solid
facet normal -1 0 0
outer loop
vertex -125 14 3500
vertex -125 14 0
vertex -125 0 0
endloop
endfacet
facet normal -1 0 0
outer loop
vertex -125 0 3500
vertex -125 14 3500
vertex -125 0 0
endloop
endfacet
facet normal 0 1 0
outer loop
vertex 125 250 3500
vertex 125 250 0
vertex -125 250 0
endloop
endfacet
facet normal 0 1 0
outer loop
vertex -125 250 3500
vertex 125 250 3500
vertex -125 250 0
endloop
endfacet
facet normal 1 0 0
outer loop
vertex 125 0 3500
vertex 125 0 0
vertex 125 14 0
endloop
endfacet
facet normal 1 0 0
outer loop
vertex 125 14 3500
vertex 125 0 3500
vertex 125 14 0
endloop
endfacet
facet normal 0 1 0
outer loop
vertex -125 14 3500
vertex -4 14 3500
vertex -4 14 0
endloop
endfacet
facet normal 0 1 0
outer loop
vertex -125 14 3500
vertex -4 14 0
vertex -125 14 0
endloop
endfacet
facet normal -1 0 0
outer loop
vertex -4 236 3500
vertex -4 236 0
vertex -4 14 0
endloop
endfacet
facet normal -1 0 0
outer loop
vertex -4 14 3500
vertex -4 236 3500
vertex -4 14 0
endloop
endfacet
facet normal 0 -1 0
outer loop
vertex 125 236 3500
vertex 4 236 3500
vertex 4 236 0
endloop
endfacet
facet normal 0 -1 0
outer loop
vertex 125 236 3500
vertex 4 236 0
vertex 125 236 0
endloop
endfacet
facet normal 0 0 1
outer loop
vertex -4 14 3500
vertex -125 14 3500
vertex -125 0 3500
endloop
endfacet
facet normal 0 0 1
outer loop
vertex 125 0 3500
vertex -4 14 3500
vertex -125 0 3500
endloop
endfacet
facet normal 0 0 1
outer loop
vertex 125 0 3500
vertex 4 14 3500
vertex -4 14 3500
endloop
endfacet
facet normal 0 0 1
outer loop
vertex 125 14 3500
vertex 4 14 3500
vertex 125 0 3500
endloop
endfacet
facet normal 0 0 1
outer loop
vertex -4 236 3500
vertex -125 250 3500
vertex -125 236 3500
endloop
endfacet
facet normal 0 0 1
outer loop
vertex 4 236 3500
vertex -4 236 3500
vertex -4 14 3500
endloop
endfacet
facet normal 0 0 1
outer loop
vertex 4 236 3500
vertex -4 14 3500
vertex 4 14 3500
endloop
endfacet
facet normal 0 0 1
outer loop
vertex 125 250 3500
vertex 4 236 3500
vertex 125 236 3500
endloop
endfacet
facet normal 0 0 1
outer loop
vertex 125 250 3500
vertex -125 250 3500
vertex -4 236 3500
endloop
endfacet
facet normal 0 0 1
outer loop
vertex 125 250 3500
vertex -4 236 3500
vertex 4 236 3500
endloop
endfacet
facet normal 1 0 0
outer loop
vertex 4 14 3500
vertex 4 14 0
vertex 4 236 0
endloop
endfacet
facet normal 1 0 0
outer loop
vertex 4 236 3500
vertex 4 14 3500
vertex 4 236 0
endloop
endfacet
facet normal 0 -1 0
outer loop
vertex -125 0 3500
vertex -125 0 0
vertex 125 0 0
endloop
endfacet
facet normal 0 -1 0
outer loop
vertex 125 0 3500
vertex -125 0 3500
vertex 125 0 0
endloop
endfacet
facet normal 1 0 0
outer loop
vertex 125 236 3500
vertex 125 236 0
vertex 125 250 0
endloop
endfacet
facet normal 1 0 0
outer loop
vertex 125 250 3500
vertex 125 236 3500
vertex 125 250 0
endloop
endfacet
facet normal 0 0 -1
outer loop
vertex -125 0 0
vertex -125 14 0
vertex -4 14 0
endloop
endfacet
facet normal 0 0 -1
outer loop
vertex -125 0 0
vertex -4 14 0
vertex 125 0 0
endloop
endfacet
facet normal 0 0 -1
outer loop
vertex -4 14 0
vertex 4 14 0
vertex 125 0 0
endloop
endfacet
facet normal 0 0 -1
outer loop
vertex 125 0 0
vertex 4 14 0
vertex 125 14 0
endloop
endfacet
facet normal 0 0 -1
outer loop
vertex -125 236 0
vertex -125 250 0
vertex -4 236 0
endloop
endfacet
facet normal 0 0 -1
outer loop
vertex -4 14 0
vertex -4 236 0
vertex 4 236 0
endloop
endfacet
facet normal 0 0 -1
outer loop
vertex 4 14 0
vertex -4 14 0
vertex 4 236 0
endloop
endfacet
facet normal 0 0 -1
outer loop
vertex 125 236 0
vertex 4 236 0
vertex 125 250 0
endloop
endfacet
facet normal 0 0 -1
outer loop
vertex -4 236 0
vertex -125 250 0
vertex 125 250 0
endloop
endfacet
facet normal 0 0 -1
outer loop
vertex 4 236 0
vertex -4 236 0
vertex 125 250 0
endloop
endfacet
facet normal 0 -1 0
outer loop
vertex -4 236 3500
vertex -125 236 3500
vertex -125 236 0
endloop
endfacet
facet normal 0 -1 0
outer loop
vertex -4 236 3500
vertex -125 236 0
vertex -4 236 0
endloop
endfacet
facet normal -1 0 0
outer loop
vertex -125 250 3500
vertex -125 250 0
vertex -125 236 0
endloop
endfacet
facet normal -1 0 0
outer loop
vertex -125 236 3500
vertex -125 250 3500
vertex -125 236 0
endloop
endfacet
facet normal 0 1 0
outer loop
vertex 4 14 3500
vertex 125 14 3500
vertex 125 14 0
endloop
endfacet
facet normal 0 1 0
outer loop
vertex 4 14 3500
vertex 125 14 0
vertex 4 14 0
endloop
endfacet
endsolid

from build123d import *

# Parameters (mm, degrees)
F1_DEPTH = 3500


with BuildPart() as f1:
    # F0 (on Top) → F1 (new body)
    with BuildSketch(Plane.XY):
        Polygon((125, 250), (0, 250), (-125, 250), (-125, 236), (-4, 236), (-4, 14), (-125, 14), (-125, 0), (0, 0), (125, 0), (125, 14), (4, 14), (4, 236), (125, 236), align=None)
    extrude(amount=F1_DEPTH)


solid = f1.part
